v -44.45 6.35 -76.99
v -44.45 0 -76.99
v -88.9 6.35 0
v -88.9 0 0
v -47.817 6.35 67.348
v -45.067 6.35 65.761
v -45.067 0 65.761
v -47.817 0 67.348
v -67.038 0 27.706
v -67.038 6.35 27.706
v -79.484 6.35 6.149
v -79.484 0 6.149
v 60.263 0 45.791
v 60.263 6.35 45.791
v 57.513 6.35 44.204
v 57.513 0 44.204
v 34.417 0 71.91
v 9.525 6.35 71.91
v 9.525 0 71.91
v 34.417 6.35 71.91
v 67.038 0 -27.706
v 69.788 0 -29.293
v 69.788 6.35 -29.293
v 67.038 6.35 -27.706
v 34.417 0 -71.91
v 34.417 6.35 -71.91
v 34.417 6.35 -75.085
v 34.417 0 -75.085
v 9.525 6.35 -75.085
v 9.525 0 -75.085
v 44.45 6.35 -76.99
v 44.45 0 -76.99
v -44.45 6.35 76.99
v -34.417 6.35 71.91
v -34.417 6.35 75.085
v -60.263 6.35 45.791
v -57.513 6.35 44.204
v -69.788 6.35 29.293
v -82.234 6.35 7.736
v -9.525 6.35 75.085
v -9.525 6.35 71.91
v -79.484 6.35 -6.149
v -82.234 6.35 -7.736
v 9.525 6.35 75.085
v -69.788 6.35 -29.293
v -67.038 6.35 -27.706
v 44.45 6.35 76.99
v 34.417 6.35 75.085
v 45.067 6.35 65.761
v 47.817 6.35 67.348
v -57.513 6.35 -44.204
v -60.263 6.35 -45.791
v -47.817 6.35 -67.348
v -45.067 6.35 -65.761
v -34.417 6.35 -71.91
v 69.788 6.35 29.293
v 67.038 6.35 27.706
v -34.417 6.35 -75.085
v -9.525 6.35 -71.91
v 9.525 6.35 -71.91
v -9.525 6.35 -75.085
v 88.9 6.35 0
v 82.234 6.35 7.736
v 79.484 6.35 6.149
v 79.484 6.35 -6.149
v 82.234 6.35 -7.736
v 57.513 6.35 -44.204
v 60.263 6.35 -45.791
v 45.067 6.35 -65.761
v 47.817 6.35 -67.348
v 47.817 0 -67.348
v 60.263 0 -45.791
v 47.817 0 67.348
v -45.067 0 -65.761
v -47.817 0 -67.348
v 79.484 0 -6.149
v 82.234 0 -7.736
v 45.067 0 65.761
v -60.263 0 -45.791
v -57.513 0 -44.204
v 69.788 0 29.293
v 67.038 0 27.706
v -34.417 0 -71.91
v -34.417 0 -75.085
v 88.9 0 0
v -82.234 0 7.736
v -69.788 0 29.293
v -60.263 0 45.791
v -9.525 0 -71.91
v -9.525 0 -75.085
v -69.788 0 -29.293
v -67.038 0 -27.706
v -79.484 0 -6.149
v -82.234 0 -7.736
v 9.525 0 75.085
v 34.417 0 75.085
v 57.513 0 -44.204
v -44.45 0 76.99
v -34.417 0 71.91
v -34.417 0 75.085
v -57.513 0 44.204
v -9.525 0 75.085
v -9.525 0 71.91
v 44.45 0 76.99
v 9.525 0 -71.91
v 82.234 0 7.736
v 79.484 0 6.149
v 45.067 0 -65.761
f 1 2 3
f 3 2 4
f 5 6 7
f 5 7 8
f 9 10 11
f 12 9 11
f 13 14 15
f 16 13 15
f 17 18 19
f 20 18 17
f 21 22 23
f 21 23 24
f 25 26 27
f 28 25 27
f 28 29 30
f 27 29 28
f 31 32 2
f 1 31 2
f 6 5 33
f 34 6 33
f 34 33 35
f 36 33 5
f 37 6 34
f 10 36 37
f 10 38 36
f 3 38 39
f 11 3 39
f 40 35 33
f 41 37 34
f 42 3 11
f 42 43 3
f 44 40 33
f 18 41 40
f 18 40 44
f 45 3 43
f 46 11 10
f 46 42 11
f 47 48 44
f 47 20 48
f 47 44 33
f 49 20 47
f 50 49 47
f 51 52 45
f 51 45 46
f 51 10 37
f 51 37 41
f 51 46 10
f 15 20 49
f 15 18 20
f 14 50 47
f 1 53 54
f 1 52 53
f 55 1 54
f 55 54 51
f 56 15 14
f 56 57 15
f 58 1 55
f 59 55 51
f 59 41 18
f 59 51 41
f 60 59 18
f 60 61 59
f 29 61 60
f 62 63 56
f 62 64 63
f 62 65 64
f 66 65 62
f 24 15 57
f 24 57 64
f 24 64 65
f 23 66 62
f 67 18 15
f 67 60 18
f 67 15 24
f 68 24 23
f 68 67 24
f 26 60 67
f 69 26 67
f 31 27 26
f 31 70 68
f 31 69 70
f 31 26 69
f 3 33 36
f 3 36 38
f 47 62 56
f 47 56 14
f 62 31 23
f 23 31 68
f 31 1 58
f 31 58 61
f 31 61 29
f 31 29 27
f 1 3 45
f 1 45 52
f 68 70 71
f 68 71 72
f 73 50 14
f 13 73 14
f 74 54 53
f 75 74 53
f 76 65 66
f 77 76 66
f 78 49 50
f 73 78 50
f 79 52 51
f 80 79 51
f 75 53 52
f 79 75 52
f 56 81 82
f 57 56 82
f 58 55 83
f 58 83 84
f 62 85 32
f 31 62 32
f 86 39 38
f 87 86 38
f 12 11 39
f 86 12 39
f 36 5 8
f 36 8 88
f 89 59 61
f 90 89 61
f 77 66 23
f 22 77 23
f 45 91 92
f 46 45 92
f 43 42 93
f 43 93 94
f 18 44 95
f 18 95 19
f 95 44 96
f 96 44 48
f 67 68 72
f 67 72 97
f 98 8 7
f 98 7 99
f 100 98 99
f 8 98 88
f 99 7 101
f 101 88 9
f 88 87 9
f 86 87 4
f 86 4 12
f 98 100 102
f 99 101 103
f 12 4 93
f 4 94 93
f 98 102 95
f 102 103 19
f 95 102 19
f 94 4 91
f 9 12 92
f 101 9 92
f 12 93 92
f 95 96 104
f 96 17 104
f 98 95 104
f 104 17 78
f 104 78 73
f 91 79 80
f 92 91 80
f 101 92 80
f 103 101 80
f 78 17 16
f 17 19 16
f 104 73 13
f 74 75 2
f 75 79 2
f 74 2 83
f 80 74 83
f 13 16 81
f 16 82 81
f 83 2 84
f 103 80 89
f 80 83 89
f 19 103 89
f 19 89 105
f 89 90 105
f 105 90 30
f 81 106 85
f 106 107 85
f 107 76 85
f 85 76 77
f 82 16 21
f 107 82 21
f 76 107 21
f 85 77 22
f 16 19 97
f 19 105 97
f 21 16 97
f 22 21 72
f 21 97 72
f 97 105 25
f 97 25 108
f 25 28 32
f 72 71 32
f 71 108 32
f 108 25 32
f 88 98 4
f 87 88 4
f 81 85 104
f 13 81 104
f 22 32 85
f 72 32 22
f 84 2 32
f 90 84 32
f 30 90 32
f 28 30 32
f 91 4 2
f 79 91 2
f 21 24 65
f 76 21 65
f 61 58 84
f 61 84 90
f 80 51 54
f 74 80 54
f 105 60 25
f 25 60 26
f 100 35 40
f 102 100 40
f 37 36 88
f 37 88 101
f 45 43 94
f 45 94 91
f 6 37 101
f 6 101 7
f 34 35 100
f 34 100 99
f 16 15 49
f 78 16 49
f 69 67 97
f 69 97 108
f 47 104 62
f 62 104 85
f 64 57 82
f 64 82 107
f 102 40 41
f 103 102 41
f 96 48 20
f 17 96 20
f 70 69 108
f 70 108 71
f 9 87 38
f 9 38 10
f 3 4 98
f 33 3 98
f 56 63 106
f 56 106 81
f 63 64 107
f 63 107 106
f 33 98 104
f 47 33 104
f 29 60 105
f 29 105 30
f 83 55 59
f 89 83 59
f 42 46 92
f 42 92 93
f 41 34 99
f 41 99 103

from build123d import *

# Parameters (mm, degrees)
BOSS_EXTRUDE1_DEPTH = 6.35
SKETCH2_W           = 24.892
SKETCH2_H           = 3.175
CUT_EXTRUDE1_DEPTH  = 7.35


with BuildPart() as part:
    # Sketch1 → Boss-Extrude1 (new body)
    with BuildSketch(Plane(origin=(0, 0, 0), x_dir=(1, 0, 0), z_dir=(0, 1, 0))):
        Polygon((-88.9, 0), (-44.45, -76.989658396), (44.45, -76.989658396), (88.9, 0), (44.45, 76.989658396), (-44.45, 76.989658396), align=None)
    extrude(amount=BOSS_EXTRUDE1_DEPTH)

    # Sketch2 → Cut-Extrude1 (cut, through all)
    with BuildSketch(Plane(origin=(0, 6.35, 0), x_dir=(1, 0, 0), z_dir=(0, 1, 0))):
        Polygon((-79.484090949, -6.148832876), (-82.233721606, -7.736332876), (-69.787721606, -29.293437227), (-67.038090949, -27.705937227), align=None)
        Polygon((-45.067090949, -65.76082552), (-47.816721606, -67.34832552), (-60.262721606, -45.791221169), (-57.513090949, -44.203721169), align=None)
        Polygon((-45.067090949, 65.76082552), (-47.816721606, 67.34832552), (-60.262721606, 45.791221169), (-57.513090949, 44.203721169), align=None)
        Polygon((-69.787721606, 29.293437227), (-67.038090949, 27.705937227), (-79.484090949, 6.148832876), (-82.233721606, 7.736332876), align=None)
        with Locations((21.971, 73.497158396)):
            Rectangle(SKETCH2_W, SKETCH2_H)
        with Locations((-21.971, 73.497158396)):
            Rectangle(SKETCH2_W, SKETCH2_H)
        Polygon((79.484090949, 6.148832876), (82.233721606, 7.736332876), (69.787721606, 29.293437227), (67.038090949, 27.705937227), align=None)
        Polygon((60.262721606, 45.791221169), (57.513090949, 44.203721169), (45.067090949, 65.76082552), (47.816721606, 67.34832552), align=None)
        Polygon((45.067090949, -65.76082552), (47.816721606, -67.34832552), (60.262721606, -45.791221169), (57.513090949, -44.203721169), align=None)
        Polygon((69.787721606, -29.293437227), (67.038090949, -27.705937227), (79.484090949, -6.148832876), (82.233721606, -7.736332876), align=None)
        with Locations((-21.971, -73.497158396)):
            Rectangle(SKETCH2_W, SKETCH2_H)
        with Locations((21.971, -73.497158396)):
            Rectangle(SKETCH2_W, SKETCH2_H)
    extrude(amount=-CUT_EXTRUDE1_DEPTH, mode=Mode.SUBTRACT)


solid = part.part
